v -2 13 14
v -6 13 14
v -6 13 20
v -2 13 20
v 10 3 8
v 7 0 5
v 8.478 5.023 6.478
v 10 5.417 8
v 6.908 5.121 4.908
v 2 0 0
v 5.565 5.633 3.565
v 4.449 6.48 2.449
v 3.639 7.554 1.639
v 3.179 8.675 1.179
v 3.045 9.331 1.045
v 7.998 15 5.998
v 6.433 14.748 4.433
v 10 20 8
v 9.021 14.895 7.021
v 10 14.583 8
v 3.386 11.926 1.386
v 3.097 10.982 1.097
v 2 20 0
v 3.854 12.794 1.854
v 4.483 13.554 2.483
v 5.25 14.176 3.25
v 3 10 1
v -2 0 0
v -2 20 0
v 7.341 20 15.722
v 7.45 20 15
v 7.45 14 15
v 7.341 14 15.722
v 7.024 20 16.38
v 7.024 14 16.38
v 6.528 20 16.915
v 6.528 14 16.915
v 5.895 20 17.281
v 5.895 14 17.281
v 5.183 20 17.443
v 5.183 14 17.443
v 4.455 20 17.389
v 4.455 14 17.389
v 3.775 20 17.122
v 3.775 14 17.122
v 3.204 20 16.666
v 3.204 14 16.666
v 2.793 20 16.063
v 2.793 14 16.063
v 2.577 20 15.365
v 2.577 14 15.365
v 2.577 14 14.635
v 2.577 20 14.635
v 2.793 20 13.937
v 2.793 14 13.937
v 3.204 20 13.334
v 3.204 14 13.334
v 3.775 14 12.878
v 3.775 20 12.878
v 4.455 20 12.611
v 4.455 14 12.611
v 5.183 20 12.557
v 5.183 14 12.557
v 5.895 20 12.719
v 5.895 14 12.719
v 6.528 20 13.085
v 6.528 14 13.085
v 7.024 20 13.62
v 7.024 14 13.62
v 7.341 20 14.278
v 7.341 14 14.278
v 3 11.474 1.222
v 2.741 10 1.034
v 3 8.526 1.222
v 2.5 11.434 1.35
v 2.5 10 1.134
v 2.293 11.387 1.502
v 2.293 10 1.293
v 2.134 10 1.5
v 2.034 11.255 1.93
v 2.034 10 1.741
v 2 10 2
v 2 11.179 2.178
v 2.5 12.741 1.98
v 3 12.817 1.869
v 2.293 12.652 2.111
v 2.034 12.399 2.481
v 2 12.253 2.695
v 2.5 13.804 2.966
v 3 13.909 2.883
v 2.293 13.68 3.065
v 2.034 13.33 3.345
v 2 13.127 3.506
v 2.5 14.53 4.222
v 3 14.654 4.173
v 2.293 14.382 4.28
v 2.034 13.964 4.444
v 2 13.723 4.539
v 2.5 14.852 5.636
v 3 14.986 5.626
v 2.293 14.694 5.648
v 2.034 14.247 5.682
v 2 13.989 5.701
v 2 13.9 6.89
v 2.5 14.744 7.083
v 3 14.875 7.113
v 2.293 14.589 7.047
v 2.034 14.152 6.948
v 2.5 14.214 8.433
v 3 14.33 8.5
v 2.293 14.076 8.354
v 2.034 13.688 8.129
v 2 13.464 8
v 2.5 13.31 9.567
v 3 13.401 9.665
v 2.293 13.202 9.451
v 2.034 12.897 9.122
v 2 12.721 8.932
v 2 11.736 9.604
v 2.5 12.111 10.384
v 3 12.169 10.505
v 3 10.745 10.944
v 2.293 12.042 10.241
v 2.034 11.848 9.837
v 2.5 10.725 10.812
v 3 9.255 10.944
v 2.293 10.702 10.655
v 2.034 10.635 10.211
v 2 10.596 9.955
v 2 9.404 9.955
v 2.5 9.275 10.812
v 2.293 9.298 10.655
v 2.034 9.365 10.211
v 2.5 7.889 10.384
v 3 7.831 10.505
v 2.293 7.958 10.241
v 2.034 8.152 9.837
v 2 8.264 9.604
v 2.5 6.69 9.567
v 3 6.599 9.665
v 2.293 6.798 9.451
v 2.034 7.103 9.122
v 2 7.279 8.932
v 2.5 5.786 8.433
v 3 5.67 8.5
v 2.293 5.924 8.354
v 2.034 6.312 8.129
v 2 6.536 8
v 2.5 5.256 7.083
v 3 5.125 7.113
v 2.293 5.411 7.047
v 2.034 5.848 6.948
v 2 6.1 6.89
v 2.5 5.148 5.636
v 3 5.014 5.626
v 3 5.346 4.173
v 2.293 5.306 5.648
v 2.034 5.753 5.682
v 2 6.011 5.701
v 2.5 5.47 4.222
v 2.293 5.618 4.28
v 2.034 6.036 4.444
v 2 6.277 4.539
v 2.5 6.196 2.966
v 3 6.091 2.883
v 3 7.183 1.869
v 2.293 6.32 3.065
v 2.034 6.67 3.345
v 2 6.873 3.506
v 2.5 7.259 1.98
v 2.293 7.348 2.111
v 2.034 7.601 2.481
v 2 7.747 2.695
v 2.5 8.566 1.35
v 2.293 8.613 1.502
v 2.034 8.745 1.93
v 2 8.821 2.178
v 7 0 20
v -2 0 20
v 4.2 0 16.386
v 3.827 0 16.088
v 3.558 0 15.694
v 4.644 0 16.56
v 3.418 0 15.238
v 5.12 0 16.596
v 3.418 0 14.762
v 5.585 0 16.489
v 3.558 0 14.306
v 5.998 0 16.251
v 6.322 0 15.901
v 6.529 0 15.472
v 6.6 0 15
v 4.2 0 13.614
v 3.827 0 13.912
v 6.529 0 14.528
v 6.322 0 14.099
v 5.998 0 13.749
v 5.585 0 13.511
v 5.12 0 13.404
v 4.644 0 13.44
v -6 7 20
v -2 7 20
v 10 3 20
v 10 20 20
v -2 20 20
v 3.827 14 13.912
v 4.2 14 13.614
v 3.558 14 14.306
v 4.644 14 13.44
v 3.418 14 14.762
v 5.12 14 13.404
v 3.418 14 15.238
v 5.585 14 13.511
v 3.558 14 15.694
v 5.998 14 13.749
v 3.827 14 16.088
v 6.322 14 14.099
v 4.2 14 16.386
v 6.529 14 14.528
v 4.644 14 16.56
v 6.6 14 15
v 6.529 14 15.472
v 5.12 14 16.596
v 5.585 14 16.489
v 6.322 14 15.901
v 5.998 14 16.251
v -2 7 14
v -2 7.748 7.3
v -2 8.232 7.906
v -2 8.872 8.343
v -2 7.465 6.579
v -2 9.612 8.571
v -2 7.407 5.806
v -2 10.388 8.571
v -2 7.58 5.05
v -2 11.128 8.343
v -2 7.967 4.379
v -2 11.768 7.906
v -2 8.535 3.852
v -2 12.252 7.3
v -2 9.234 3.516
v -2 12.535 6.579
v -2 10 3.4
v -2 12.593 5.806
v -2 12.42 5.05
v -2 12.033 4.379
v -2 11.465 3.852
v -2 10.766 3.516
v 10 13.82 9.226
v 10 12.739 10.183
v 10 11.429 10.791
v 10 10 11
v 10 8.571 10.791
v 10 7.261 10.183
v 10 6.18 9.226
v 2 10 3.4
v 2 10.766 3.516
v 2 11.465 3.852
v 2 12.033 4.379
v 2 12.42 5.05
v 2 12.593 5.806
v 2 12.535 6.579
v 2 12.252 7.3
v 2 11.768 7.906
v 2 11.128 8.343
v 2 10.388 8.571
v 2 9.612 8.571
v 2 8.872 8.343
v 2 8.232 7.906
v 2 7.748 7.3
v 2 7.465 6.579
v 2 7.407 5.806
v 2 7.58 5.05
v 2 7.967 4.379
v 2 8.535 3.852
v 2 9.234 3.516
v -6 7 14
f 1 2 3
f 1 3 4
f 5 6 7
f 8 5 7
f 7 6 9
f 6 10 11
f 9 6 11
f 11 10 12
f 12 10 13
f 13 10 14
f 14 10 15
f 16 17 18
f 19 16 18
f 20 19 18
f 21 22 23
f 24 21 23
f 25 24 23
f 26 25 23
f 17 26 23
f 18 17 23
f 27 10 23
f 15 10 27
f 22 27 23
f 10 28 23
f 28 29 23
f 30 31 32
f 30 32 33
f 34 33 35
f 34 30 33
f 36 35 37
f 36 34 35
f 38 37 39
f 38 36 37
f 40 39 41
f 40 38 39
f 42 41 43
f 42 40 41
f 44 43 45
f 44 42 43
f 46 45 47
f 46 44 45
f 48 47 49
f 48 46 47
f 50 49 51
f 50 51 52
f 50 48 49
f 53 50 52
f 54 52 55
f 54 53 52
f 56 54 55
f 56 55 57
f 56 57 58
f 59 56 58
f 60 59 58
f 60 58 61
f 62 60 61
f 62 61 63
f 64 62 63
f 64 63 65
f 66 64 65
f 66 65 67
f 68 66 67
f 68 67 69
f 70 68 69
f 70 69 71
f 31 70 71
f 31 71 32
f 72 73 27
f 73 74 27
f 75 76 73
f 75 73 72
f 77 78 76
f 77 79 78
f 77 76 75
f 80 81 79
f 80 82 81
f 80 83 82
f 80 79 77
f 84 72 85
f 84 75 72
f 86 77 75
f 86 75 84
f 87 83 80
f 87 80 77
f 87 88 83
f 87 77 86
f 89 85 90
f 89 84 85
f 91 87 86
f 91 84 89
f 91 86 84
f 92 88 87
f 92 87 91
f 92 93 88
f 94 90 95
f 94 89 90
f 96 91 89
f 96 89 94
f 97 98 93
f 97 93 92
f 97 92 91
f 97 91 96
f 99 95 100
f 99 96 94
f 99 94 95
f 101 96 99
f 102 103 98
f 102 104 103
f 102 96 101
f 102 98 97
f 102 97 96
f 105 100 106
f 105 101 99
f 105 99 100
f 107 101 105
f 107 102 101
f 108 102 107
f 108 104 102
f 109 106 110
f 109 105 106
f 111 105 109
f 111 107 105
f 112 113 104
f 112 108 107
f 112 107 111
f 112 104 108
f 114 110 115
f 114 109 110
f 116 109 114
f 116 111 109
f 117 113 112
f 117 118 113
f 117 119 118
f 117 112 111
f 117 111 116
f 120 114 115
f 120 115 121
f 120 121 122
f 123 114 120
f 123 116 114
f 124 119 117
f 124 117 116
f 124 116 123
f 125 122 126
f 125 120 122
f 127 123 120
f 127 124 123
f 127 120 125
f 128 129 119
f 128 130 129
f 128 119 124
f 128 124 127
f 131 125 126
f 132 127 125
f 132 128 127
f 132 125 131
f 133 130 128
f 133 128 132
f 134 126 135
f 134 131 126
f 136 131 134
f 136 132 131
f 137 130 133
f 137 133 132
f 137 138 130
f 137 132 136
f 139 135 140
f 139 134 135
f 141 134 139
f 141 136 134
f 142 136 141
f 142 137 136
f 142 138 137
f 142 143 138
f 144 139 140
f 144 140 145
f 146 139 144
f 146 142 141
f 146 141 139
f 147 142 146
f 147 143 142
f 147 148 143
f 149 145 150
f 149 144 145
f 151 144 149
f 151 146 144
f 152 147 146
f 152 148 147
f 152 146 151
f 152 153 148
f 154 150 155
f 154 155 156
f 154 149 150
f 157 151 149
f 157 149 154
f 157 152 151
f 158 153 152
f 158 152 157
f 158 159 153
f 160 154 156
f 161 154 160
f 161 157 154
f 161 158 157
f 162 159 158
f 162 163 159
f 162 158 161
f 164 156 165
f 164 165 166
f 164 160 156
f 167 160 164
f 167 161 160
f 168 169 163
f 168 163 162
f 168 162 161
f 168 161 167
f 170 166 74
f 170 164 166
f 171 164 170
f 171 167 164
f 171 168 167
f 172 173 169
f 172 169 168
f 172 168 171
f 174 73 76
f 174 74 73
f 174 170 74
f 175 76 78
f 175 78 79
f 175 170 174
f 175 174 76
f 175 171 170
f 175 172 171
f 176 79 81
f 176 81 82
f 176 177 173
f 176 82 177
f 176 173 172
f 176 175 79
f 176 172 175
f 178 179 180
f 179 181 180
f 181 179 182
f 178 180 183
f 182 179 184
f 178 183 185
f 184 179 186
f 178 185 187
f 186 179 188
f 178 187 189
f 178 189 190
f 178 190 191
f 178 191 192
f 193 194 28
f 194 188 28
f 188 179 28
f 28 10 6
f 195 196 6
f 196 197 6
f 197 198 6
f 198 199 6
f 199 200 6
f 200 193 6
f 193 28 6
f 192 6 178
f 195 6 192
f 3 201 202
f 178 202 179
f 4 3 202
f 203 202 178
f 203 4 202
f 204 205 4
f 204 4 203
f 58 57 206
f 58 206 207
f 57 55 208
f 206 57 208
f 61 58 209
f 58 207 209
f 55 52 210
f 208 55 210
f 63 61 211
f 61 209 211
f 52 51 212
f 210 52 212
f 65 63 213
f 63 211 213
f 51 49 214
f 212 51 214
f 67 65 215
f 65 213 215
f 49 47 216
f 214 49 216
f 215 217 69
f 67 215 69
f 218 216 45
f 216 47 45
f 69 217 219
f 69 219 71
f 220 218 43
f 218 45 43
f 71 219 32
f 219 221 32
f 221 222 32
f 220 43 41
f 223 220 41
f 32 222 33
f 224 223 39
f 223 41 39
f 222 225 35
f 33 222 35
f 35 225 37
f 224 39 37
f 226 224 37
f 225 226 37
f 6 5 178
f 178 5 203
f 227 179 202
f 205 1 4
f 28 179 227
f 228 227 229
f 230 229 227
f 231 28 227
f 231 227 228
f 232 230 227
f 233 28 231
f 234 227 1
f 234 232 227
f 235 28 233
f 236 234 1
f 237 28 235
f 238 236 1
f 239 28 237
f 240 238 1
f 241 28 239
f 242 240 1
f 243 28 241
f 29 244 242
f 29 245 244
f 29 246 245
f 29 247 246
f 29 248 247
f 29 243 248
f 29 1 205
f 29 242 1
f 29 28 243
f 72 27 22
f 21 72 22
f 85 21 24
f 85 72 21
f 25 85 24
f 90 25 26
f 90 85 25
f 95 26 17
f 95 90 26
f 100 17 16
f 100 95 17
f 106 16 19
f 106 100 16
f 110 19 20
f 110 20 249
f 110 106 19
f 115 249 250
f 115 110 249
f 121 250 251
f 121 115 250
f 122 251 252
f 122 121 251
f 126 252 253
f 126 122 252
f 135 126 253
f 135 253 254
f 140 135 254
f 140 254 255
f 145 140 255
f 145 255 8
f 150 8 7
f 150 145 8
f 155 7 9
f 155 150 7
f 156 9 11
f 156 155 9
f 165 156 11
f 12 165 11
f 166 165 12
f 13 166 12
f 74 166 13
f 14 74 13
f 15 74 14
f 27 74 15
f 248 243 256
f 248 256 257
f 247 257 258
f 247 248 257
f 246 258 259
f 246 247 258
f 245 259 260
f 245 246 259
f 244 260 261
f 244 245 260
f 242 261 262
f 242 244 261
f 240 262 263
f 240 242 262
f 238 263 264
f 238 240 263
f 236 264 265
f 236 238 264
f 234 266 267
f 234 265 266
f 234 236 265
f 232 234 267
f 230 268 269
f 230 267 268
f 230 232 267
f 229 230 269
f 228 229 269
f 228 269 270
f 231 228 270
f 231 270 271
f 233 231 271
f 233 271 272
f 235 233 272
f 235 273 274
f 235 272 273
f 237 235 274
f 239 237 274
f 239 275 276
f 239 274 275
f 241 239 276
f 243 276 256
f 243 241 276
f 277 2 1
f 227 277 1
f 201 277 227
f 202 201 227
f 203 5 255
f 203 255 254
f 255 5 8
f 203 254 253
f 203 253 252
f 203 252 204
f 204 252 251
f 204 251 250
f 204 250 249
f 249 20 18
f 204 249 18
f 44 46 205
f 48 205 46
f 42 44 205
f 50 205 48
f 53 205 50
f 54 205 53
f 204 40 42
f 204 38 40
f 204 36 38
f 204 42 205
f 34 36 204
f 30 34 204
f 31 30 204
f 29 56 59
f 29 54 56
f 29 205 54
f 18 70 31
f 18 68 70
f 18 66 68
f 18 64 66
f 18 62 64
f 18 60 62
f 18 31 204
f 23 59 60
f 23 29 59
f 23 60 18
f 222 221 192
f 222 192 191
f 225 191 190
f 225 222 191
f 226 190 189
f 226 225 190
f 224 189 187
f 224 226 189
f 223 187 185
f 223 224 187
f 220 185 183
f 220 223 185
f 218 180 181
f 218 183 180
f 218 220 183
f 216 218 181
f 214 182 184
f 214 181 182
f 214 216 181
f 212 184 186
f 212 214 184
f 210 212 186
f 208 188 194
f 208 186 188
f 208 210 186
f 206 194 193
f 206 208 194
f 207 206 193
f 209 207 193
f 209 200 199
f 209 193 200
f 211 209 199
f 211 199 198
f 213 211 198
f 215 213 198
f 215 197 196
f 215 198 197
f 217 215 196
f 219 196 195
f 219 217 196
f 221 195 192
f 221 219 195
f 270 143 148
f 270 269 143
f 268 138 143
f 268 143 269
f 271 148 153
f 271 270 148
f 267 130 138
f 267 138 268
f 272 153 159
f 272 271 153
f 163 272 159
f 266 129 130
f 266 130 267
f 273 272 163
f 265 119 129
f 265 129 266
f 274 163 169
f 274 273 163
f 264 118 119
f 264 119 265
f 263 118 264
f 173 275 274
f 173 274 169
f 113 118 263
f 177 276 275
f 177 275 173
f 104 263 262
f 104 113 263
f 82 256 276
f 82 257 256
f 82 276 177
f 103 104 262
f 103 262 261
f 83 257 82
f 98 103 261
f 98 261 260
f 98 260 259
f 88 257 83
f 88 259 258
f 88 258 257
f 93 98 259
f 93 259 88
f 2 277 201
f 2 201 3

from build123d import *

# Parameters (mm, degrees)
CYLINDER002_R     = 2.6
CYLINDER002_DEPTH = 20
CYLINDER001_R     = 5
CYLINDER001_DEPTH = 16
FILLET_R          = 1
CYLINDER003_R     = 1.6
CYLINDER003_DEPTH = 28
CYLINDER_R        = 2.45
CYLINDER_DEPTH    = 30
BOX001_W          = 10
BOX001_H          = 6
BOX001_DEPTH      = 6
BOX_W             = 12
BOX_H             = 20
BOX_DEPTH         = 20
CHAMFER_SIZE      = 8
CHAMFER001_SIZE   = 3


with BuildPart() as cilindro002:
    # Cylinder002 → Cylinder002 (new body)
    with BuildSketch(Plane(origin=(-9, 10, 6), x_dir=(0, 0, -1), z_dir=(1, 0, 0))):
        Circle(CYLINDER002_R)
    extrude(amount=CYLINDER002_DEPTH)


with BuildPart() as fillet_body:
    # Cylinder001 → Cylinder001 (new body)
    with BuildSketch(Plane(origin=(6, 10, 6), x_dir=(0, 0, -1), z_dir=(1, 0, 0))):
        Circle(CYLINDER001_R)
    extrude(amount=CYLINDER001_DEPTH)

    # Fillet
    fillet_edges = [fillet_body.edges().sort_by_distance(p)[0] for p in [
        (6, 10, 11),
    ]]
    fillet(fillet_edges, radius=FILLET_R)


with BuildPart() as fillet_body_1:
    # Fillet placement: moved
    add(fillet_body.part.moved(Location((-4, 0, 0))))


with BuildPart() as cilindro003:
    # Cylinder003 → Cylinder003 (new body)
    with BuildSketch(Plane(origin=(7, 23, 15), x_dir=(1, 0, 0), z_dir=(0, -1, 0))):
        Circle(CYLINDER003_R)
    extrude(amount=CYLINDER003_DEPTH)


with BuildPart() as cilindro:
    # Cylinder → Cylinder (new body)
    with BuildSketch(Plane(origin=(7, 44, 15), x_dir=(1, 0, 0), z_dir=(0, -1, 0))):
        Circle(CYLINDER_R)
    extrude(amount=CYLINDER_DEPTH)


with BuildPart() as cubo001:
    # Box001 → Box001 (new body)
    with BuildSketch(Plane(origin=(-4, 7, 14), x_dir=(1, 0, 0), z_dir=(0, 0, 1))):
        with Locations((5, 3)):
            Rectangle(BOX001_W, BOX001_H)
    extrude(amount=BOX001_DEPTH)


with BuildPart() as chamfer001:
    # Box → Box (new body)
    with BuildSketch(Plane.XY):
        with Locations((6, 10)):
            Rectangle(BOX_W, BOX_H)
    extrude(amount=BOX_DEPTH)

    # Fusion: union Cubo001
    add(cubo001.part)

    # Cut: cut Cilindro
    add(cilindro.part, mode=Mode.SUBTRACT)

    # Cut001: cut Cilindro003
    add(cilindro003.part, mode=Mode.SUBTRACT)

    # Chamfer
    chamfer_edges = [chamfer001.edges().sort_by_distance(p)[0] for p in [
        (12, 10, 0),
    ]]
    chamfer(chamfer_edges, length=CHAMFER_SIZE)


with BuildPart() as chamfer001_1:
    # Chamfer placement: moved
    add(chamfer001.part.moved(Location((-2, 0, 0))))

    # Cut002: cut Fillet body
    add(fillet_body_1.part, mode=Mode.SUBTRACT)

    # Cut003: cut Cilindro002
    add(cilindro002.part, mode=Mode.SUBTRACT)

    # Chamfer001
    chamfer001_edges = [chamfer001_1.edges().sort_by_distance(p)[0] for p in [
        (10, 0, 14),
    ]]
    chamfer(chamfer001_edges, length=CHAMFER001_SIZE)


solid = chamfer001_1.part
